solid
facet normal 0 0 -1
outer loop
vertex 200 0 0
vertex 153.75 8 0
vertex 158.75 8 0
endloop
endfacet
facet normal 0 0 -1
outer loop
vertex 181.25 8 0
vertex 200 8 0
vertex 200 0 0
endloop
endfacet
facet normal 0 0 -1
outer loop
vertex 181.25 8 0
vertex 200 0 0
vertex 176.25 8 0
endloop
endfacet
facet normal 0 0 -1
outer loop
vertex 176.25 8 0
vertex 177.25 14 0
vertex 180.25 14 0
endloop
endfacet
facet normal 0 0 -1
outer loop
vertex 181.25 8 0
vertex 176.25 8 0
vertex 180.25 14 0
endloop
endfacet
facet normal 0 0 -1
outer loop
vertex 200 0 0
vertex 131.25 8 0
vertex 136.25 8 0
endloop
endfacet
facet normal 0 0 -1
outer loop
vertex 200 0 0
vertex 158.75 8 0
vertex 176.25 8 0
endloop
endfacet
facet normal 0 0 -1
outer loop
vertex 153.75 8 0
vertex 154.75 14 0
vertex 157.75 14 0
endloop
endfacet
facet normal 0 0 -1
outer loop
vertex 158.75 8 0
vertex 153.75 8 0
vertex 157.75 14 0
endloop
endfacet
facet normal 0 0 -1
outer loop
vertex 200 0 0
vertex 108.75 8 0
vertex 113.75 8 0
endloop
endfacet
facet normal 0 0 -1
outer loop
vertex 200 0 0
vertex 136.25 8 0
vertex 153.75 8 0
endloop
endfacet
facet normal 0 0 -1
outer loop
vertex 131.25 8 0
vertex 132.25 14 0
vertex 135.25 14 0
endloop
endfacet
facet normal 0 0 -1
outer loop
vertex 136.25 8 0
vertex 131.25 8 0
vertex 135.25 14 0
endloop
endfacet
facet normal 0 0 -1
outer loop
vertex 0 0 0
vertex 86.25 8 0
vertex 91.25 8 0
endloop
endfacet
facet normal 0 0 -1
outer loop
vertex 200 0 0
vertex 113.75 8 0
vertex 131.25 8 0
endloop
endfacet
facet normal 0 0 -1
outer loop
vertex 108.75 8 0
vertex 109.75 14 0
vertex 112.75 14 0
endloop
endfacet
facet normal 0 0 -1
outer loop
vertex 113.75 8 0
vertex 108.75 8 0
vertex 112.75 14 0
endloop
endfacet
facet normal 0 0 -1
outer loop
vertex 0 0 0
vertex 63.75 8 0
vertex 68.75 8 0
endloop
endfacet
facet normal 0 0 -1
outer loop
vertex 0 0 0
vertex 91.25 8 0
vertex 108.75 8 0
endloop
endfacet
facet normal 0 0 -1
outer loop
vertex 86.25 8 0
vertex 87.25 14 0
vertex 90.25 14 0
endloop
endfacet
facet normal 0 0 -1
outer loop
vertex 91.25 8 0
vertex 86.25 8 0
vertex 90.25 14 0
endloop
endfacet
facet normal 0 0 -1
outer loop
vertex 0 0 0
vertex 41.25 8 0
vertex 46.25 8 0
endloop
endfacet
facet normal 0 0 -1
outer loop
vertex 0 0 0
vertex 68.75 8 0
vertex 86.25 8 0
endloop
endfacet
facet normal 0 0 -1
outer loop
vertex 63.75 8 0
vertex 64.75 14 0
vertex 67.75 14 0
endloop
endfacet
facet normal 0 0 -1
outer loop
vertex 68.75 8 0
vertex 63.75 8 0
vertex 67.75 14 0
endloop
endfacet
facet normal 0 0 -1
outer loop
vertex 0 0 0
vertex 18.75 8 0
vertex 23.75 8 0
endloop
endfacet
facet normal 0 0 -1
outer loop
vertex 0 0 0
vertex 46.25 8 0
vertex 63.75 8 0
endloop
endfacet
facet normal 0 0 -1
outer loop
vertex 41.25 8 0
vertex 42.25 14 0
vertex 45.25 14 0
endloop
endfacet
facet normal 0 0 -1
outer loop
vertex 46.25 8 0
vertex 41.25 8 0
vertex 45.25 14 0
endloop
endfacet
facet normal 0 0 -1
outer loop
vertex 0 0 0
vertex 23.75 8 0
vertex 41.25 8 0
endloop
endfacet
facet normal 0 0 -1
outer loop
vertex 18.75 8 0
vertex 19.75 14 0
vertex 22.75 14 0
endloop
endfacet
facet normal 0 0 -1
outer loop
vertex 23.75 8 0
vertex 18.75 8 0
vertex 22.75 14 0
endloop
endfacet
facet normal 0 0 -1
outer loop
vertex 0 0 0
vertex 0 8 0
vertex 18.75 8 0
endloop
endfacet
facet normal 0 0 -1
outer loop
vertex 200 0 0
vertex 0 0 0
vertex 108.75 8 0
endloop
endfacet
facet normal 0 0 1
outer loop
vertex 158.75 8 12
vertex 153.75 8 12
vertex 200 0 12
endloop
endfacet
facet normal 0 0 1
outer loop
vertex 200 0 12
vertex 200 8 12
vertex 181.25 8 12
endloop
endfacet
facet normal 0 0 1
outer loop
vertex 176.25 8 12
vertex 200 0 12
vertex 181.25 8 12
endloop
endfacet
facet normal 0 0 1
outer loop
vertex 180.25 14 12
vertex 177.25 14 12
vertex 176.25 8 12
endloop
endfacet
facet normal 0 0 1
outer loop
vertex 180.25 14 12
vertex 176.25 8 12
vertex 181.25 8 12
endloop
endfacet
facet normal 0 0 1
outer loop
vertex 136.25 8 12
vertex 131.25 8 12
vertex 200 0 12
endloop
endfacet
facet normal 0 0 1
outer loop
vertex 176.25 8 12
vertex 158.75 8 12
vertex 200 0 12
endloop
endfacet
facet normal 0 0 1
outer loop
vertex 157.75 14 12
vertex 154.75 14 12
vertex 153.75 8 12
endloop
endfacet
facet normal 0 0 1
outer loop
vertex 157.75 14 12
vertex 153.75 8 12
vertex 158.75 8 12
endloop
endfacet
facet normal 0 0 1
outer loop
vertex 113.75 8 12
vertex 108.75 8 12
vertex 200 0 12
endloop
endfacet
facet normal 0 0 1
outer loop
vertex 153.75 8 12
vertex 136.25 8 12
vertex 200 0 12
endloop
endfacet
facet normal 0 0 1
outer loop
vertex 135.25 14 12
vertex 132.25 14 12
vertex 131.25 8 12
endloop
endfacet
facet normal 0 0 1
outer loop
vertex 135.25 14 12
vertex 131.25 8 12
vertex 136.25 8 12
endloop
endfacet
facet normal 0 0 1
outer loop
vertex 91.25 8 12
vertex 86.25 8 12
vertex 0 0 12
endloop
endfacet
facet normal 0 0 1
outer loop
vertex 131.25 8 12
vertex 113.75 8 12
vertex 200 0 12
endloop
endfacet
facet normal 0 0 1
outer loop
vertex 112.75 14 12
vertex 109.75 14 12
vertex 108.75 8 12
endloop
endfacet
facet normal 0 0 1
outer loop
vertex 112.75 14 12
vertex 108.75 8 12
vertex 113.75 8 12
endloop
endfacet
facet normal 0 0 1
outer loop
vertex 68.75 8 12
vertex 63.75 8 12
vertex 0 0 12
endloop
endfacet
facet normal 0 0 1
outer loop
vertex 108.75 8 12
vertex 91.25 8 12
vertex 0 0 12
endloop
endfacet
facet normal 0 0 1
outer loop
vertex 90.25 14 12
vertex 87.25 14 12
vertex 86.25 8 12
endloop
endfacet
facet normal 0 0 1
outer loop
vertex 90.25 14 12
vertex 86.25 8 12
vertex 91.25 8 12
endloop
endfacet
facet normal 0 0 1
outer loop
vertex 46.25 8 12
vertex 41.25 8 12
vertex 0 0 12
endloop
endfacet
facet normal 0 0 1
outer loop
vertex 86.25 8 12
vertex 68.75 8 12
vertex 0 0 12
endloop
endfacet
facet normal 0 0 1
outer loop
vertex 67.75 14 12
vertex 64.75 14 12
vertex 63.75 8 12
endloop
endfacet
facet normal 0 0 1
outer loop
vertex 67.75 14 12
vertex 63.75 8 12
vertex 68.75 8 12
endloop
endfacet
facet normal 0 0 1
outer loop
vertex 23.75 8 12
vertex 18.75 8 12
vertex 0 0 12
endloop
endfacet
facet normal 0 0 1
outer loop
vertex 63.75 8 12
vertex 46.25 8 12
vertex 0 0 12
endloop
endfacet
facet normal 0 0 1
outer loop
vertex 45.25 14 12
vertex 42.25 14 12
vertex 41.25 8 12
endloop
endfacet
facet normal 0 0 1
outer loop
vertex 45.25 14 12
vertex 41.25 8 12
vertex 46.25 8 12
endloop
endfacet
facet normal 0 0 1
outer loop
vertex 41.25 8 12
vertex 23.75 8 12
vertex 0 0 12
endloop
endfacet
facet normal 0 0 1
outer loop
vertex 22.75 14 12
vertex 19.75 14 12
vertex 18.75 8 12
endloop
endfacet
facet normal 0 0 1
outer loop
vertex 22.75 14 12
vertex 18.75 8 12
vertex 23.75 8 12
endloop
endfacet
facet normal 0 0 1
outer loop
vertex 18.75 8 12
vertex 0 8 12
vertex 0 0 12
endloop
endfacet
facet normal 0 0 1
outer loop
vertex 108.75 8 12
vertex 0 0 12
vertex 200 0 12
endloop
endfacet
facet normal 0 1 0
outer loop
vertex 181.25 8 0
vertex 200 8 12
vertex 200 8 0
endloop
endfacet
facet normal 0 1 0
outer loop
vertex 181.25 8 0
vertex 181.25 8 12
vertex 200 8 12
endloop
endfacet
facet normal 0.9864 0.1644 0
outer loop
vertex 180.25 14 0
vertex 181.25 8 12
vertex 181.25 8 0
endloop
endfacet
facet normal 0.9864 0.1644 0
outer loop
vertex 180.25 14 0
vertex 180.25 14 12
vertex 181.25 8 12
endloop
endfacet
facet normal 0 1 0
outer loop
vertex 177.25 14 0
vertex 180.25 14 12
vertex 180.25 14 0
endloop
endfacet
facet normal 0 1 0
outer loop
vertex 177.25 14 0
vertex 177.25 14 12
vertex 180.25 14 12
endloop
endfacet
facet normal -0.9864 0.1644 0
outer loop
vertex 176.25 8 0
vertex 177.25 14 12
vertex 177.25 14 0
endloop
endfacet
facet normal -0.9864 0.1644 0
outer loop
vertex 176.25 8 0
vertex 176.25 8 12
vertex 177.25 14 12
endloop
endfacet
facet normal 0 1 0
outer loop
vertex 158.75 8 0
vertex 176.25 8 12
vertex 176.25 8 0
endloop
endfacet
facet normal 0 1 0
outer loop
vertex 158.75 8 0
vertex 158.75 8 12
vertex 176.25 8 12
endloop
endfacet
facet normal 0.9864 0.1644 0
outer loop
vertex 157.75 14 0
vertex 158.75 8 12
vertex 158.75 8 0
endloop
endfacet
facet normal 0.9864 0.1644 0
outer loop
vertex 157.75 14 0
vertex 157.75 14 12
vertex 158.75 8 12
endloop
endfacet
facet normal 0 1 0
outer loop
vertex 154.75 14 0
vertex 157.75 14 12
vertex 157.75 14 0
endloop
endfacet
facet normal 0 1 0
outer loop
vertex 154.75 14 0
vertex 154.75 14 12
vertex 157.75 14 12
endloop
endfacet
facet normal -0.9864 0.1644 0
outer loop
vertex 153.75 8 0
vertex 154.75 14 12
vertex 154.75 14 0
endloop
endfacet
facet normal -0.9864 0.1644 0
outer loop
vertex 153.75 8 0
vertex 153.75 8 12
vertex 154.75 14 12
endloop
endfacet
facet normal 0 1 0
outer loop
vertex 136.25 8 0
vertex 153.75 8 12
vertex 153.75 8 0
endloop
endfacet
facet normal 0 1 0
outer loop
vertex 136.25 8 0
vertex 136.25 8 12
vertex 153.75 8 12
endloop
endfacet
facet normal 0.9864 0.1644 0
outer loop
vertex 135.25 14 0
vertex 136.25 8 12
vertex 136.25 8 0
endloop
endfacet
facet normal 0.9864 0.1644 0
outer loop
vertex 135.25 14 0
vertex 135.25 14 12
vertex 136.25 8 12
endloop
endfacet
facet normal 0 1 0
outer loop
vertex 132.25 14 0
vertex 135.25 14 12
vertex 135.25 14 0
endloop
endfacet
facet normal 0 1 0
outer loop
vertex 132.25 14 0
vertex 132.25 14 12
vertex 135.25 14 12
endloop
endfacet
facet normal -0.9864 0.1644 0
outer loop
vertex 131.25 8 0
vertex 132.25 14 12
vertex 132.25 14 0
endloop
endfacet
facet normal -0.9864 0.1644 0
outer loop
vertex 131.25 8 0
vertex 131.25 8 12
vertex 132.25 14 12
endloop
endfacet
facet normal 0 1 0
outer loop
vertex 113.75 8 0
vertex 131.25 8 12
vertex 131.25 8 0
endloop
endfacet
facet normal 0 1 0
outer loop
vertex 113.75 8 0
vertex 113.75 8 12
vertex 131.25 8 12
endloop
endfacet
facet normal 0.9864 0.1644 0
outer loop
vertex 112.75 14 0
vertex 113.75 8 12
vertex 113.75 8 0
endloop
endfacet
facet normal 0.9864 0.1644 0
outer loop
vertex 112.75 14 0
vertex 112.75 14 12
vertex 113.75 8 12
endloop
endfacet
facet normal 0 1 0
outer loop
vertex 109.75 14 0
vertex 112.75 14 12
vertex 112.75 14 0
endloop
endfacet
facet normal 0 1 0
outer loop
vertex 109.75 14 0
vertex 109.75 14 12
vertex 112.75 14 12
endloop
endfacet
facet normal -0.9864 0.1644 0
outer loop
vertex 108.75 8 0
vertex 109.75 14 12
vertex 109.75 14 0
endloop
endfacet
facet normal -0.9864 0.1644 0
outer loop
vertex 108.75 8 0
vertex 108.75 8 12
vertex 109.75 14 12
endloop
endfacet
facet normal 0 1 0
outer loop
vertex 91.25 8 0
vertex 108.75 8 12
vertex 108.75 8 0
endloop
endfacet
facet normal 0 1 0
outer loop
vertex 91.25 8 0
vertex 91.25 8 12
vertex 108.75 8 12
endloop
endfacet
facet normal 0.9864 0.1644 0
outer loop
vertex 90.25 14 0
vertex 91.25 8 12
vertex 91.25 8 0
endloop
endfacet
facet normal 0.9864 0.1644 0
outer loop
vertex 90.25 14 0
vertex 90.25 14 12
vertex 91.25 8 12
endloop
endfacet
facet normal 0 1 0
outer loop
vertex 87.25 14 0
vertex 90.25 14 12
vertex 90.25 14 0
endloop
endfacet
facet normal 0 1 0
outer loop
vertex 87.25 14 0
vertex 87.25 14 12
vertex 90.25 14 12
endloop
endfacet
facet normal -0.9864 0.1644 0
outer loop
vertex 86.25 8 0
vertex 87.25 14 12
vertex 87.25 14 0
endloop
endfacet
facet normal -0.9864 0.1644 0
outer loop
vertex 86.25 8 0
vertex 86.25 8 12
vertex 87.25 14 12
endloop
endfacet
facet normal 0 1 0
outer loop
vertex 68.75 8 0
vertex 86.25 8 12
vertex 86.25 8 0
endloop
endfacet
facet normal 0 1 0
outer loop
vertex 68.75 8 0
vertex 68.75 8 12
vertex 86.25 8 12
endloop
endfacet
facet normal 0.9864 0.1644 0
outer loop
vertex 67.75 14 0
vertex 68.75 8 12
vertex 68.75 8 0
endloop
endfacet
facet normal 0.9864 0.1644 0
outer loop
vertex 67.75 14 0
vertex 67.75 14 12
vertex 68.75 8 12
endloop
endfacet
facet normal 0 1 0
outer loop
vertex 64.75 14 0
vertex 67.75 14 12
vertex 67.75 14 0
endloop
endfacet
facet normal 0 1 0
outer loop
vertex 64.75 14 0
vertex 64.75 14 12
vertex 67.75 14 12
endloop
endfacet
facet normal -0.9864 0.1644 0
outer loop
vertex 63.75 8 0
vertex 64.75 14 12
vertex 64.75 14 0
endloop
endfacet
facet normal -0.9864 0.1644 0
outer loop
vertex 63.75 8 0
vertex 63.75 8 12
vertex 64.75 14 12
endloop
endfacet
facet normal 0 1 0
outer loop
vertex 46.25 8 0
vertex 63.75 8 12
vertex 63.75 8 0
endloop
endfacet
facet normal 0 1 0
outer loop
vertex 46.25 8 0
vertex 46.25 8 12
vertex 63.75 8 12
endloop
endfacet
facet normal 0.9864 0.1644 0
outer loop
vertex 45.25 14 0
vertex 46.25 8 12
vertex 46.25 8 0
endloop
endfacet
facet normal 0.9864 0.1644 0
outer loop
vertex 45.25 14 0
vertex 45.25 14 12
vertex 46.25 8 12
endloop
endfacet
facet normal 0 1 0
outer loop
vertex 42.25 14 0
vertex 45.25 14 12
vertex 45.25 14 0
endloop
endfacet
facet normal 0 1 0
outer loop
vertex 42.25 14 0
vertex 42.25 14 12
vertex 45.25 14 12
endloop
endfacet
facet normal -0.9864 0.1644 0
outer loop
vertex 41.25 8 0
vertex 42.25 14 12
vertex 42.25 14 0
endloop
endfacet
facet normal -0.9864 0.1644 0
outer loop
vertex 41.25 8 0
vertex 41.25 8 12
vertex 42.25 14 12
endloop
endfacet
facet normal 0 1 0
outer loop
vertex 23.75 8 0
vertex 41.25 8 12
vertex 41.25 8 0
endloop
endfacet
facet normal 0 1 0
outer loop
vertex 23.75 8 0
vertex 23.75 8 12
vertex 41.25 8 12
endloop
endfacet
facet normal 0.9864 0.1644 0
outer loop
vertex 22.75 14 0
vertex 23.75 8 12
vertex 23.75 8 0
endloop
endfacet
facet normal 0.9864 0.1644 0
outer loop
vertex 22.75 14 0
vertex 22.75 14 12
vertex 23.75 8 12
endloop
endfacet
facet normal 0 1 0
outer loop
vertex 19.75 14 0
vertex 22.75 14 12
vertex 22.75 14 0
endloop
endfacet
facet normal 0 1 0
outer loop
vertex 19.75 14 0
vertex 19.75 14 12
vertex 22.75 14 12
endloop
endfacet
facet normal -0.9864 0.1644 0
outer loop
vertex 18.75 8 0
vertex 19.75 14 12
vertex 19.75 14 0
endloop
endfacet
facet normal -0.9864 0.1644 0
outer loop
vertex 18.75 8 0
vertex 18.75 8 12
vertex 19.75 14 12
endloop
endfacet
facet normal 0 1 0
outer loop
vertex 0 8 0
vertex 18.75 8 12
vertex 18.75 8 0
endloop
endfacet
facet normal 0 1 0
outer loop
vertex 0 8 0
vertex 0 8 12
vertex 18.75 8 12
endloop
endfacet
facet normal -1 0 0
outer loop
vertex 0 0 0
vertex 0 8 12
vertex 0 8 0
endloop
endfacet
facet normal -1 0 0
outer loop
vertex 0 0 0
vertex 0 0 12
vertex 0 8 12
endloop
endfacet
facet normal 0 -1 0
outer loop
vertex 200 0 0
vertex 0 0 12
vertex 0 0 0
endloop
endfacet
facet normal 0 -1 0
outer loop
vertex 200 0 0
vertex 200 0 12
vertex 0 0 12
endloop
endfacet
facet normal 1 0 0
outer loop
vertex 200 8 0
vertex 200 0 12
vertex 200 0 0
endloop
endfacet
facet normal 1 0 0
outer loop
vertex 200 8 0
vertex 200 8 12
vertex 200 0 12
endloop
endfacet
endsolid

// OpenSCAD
$fn = 32;

// ----------------------------------------------------------------------
// Gear rack: 8 teeth on a 200 mm bar, pitch 22.5 mm
// ----------------------------------------------------------------------

// --- parameters (mm) ---
profile_height = 12;      // extrusion height
profile_points = 36;      // points of the closed outline

profile = [[0, 0], [200, 0], [200, 8], [181.25, 8], [180.25, 14], [177.25, 14], [176.25, 8], [158.75, 8], [157.75, 14], [154.75, 14], [153.75, 8], [136.25, 8], [135.25, 14], [132.25, 14], [131.25, 8], [113.75, 8], [112.75, 14], [109.75, 14], [108.75, 8], [91.25, 8], [90.25, 14], [87.25, 14], [86.25, 8], [68.75, 8], [67.75, 14], [64.75, 14], [63.75, 8], [46.25, 8], [45.25, 14], [42.25, 14], [41.25, 8], [23.75, 8], [22.75, 14], [19.75, 14], [18.75, 8], [0, 8]];  // single closed polygon, 36 points, counter clockwise

// --- the one profile operation ---
linear_extrude(height = profile_height) polygon(points = profile);
